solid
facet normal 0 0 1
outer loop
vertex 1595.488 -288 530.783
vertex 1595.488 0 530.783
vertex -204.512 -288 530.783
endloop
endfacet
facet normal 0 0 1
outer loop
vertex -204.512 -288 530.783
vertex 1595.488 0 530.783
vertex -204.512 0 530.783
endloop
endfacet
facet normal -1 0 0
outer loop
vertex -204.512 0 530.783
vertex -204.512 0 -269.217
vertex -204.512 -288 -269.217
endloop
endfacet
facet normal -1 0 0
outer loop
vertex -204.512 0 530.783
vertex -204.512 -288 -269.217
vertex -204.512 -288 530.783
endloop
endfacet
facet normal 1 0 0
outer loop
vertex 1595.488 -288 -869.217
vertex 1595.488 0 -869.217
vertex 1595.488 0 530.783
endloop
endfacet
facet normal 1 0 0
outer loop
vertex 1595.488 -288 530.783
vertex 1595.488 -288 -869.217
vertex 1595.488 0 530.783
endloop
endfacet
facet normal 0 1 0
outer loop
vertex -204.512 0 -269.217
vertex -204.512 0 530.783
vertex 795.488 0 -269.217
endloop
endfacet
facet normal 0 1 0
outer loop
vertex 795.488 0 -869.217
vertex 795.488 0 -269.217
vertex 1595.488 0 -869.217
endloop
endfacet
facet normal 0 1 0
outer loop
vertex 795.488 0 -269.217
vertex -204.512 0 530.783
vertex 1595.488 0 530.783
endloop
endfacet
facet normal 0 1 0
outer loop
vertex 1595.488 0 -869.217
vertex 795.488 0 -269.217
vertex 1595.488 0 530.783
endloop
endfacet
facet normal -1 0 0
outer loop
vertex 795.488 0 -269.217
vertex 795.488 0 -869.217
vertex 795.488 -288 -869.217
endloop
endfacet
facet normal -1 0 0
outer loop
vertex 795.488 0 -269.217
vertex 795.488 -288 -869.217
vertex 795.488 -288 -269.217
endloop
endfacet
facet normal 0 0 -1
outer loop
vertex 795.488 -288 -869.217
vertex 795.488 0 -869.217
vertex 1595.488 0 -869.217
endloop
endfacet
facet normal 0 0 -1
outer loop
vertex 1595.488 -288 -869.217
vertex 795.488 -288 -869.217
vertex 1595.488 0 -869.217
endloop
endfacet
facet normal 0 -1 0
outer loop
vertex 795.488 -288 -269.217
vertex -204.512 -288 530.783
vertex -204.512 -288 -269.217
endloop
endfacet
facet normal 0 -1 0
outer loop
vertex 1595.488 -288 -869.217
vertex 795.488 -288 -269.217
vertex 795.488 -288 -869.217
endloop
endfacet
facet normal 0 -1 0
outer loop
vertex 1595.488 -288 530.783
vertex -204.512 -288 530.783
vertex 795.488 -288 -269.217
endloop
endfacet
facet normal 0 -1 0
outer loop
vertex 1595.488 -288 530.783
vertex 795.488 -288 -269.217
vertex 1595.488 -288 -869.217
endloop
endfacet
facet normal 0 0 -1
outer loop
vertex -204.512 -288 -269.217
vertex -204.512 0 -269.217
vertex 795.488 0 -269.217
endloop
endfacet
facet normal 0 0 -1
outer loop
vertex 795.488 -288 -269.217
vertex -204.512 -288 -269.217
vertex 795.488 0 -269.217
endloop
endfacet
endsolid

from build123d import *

# Parameters (mm, degrees)
F0_W     = 600
F0_H     = 800
F0_W_2   = 800
F0_H_2   = 600
F1_DEPTH = 288


with BuildPart() as f1:
    # F0 (on Front) → F1 (new body)
    with BuildSketch(Plane.XZ):
        with Locations((95.488157, 130.783261)):
            Rectangle(F0_W, F0_H)
        with Locations((1195.488157, -569.216739)):
            Rectangle(F0_W_2, F0_H_2)
        Polygon((1595.488157, 530.783261), (395.488157, 530.783261), (395.488157, -269.216739), (795.488157, -269.216739), (1595.488157, -269.216739), align=None)
    extrude(amount=F1_DEPTH)


solid = f1.part
